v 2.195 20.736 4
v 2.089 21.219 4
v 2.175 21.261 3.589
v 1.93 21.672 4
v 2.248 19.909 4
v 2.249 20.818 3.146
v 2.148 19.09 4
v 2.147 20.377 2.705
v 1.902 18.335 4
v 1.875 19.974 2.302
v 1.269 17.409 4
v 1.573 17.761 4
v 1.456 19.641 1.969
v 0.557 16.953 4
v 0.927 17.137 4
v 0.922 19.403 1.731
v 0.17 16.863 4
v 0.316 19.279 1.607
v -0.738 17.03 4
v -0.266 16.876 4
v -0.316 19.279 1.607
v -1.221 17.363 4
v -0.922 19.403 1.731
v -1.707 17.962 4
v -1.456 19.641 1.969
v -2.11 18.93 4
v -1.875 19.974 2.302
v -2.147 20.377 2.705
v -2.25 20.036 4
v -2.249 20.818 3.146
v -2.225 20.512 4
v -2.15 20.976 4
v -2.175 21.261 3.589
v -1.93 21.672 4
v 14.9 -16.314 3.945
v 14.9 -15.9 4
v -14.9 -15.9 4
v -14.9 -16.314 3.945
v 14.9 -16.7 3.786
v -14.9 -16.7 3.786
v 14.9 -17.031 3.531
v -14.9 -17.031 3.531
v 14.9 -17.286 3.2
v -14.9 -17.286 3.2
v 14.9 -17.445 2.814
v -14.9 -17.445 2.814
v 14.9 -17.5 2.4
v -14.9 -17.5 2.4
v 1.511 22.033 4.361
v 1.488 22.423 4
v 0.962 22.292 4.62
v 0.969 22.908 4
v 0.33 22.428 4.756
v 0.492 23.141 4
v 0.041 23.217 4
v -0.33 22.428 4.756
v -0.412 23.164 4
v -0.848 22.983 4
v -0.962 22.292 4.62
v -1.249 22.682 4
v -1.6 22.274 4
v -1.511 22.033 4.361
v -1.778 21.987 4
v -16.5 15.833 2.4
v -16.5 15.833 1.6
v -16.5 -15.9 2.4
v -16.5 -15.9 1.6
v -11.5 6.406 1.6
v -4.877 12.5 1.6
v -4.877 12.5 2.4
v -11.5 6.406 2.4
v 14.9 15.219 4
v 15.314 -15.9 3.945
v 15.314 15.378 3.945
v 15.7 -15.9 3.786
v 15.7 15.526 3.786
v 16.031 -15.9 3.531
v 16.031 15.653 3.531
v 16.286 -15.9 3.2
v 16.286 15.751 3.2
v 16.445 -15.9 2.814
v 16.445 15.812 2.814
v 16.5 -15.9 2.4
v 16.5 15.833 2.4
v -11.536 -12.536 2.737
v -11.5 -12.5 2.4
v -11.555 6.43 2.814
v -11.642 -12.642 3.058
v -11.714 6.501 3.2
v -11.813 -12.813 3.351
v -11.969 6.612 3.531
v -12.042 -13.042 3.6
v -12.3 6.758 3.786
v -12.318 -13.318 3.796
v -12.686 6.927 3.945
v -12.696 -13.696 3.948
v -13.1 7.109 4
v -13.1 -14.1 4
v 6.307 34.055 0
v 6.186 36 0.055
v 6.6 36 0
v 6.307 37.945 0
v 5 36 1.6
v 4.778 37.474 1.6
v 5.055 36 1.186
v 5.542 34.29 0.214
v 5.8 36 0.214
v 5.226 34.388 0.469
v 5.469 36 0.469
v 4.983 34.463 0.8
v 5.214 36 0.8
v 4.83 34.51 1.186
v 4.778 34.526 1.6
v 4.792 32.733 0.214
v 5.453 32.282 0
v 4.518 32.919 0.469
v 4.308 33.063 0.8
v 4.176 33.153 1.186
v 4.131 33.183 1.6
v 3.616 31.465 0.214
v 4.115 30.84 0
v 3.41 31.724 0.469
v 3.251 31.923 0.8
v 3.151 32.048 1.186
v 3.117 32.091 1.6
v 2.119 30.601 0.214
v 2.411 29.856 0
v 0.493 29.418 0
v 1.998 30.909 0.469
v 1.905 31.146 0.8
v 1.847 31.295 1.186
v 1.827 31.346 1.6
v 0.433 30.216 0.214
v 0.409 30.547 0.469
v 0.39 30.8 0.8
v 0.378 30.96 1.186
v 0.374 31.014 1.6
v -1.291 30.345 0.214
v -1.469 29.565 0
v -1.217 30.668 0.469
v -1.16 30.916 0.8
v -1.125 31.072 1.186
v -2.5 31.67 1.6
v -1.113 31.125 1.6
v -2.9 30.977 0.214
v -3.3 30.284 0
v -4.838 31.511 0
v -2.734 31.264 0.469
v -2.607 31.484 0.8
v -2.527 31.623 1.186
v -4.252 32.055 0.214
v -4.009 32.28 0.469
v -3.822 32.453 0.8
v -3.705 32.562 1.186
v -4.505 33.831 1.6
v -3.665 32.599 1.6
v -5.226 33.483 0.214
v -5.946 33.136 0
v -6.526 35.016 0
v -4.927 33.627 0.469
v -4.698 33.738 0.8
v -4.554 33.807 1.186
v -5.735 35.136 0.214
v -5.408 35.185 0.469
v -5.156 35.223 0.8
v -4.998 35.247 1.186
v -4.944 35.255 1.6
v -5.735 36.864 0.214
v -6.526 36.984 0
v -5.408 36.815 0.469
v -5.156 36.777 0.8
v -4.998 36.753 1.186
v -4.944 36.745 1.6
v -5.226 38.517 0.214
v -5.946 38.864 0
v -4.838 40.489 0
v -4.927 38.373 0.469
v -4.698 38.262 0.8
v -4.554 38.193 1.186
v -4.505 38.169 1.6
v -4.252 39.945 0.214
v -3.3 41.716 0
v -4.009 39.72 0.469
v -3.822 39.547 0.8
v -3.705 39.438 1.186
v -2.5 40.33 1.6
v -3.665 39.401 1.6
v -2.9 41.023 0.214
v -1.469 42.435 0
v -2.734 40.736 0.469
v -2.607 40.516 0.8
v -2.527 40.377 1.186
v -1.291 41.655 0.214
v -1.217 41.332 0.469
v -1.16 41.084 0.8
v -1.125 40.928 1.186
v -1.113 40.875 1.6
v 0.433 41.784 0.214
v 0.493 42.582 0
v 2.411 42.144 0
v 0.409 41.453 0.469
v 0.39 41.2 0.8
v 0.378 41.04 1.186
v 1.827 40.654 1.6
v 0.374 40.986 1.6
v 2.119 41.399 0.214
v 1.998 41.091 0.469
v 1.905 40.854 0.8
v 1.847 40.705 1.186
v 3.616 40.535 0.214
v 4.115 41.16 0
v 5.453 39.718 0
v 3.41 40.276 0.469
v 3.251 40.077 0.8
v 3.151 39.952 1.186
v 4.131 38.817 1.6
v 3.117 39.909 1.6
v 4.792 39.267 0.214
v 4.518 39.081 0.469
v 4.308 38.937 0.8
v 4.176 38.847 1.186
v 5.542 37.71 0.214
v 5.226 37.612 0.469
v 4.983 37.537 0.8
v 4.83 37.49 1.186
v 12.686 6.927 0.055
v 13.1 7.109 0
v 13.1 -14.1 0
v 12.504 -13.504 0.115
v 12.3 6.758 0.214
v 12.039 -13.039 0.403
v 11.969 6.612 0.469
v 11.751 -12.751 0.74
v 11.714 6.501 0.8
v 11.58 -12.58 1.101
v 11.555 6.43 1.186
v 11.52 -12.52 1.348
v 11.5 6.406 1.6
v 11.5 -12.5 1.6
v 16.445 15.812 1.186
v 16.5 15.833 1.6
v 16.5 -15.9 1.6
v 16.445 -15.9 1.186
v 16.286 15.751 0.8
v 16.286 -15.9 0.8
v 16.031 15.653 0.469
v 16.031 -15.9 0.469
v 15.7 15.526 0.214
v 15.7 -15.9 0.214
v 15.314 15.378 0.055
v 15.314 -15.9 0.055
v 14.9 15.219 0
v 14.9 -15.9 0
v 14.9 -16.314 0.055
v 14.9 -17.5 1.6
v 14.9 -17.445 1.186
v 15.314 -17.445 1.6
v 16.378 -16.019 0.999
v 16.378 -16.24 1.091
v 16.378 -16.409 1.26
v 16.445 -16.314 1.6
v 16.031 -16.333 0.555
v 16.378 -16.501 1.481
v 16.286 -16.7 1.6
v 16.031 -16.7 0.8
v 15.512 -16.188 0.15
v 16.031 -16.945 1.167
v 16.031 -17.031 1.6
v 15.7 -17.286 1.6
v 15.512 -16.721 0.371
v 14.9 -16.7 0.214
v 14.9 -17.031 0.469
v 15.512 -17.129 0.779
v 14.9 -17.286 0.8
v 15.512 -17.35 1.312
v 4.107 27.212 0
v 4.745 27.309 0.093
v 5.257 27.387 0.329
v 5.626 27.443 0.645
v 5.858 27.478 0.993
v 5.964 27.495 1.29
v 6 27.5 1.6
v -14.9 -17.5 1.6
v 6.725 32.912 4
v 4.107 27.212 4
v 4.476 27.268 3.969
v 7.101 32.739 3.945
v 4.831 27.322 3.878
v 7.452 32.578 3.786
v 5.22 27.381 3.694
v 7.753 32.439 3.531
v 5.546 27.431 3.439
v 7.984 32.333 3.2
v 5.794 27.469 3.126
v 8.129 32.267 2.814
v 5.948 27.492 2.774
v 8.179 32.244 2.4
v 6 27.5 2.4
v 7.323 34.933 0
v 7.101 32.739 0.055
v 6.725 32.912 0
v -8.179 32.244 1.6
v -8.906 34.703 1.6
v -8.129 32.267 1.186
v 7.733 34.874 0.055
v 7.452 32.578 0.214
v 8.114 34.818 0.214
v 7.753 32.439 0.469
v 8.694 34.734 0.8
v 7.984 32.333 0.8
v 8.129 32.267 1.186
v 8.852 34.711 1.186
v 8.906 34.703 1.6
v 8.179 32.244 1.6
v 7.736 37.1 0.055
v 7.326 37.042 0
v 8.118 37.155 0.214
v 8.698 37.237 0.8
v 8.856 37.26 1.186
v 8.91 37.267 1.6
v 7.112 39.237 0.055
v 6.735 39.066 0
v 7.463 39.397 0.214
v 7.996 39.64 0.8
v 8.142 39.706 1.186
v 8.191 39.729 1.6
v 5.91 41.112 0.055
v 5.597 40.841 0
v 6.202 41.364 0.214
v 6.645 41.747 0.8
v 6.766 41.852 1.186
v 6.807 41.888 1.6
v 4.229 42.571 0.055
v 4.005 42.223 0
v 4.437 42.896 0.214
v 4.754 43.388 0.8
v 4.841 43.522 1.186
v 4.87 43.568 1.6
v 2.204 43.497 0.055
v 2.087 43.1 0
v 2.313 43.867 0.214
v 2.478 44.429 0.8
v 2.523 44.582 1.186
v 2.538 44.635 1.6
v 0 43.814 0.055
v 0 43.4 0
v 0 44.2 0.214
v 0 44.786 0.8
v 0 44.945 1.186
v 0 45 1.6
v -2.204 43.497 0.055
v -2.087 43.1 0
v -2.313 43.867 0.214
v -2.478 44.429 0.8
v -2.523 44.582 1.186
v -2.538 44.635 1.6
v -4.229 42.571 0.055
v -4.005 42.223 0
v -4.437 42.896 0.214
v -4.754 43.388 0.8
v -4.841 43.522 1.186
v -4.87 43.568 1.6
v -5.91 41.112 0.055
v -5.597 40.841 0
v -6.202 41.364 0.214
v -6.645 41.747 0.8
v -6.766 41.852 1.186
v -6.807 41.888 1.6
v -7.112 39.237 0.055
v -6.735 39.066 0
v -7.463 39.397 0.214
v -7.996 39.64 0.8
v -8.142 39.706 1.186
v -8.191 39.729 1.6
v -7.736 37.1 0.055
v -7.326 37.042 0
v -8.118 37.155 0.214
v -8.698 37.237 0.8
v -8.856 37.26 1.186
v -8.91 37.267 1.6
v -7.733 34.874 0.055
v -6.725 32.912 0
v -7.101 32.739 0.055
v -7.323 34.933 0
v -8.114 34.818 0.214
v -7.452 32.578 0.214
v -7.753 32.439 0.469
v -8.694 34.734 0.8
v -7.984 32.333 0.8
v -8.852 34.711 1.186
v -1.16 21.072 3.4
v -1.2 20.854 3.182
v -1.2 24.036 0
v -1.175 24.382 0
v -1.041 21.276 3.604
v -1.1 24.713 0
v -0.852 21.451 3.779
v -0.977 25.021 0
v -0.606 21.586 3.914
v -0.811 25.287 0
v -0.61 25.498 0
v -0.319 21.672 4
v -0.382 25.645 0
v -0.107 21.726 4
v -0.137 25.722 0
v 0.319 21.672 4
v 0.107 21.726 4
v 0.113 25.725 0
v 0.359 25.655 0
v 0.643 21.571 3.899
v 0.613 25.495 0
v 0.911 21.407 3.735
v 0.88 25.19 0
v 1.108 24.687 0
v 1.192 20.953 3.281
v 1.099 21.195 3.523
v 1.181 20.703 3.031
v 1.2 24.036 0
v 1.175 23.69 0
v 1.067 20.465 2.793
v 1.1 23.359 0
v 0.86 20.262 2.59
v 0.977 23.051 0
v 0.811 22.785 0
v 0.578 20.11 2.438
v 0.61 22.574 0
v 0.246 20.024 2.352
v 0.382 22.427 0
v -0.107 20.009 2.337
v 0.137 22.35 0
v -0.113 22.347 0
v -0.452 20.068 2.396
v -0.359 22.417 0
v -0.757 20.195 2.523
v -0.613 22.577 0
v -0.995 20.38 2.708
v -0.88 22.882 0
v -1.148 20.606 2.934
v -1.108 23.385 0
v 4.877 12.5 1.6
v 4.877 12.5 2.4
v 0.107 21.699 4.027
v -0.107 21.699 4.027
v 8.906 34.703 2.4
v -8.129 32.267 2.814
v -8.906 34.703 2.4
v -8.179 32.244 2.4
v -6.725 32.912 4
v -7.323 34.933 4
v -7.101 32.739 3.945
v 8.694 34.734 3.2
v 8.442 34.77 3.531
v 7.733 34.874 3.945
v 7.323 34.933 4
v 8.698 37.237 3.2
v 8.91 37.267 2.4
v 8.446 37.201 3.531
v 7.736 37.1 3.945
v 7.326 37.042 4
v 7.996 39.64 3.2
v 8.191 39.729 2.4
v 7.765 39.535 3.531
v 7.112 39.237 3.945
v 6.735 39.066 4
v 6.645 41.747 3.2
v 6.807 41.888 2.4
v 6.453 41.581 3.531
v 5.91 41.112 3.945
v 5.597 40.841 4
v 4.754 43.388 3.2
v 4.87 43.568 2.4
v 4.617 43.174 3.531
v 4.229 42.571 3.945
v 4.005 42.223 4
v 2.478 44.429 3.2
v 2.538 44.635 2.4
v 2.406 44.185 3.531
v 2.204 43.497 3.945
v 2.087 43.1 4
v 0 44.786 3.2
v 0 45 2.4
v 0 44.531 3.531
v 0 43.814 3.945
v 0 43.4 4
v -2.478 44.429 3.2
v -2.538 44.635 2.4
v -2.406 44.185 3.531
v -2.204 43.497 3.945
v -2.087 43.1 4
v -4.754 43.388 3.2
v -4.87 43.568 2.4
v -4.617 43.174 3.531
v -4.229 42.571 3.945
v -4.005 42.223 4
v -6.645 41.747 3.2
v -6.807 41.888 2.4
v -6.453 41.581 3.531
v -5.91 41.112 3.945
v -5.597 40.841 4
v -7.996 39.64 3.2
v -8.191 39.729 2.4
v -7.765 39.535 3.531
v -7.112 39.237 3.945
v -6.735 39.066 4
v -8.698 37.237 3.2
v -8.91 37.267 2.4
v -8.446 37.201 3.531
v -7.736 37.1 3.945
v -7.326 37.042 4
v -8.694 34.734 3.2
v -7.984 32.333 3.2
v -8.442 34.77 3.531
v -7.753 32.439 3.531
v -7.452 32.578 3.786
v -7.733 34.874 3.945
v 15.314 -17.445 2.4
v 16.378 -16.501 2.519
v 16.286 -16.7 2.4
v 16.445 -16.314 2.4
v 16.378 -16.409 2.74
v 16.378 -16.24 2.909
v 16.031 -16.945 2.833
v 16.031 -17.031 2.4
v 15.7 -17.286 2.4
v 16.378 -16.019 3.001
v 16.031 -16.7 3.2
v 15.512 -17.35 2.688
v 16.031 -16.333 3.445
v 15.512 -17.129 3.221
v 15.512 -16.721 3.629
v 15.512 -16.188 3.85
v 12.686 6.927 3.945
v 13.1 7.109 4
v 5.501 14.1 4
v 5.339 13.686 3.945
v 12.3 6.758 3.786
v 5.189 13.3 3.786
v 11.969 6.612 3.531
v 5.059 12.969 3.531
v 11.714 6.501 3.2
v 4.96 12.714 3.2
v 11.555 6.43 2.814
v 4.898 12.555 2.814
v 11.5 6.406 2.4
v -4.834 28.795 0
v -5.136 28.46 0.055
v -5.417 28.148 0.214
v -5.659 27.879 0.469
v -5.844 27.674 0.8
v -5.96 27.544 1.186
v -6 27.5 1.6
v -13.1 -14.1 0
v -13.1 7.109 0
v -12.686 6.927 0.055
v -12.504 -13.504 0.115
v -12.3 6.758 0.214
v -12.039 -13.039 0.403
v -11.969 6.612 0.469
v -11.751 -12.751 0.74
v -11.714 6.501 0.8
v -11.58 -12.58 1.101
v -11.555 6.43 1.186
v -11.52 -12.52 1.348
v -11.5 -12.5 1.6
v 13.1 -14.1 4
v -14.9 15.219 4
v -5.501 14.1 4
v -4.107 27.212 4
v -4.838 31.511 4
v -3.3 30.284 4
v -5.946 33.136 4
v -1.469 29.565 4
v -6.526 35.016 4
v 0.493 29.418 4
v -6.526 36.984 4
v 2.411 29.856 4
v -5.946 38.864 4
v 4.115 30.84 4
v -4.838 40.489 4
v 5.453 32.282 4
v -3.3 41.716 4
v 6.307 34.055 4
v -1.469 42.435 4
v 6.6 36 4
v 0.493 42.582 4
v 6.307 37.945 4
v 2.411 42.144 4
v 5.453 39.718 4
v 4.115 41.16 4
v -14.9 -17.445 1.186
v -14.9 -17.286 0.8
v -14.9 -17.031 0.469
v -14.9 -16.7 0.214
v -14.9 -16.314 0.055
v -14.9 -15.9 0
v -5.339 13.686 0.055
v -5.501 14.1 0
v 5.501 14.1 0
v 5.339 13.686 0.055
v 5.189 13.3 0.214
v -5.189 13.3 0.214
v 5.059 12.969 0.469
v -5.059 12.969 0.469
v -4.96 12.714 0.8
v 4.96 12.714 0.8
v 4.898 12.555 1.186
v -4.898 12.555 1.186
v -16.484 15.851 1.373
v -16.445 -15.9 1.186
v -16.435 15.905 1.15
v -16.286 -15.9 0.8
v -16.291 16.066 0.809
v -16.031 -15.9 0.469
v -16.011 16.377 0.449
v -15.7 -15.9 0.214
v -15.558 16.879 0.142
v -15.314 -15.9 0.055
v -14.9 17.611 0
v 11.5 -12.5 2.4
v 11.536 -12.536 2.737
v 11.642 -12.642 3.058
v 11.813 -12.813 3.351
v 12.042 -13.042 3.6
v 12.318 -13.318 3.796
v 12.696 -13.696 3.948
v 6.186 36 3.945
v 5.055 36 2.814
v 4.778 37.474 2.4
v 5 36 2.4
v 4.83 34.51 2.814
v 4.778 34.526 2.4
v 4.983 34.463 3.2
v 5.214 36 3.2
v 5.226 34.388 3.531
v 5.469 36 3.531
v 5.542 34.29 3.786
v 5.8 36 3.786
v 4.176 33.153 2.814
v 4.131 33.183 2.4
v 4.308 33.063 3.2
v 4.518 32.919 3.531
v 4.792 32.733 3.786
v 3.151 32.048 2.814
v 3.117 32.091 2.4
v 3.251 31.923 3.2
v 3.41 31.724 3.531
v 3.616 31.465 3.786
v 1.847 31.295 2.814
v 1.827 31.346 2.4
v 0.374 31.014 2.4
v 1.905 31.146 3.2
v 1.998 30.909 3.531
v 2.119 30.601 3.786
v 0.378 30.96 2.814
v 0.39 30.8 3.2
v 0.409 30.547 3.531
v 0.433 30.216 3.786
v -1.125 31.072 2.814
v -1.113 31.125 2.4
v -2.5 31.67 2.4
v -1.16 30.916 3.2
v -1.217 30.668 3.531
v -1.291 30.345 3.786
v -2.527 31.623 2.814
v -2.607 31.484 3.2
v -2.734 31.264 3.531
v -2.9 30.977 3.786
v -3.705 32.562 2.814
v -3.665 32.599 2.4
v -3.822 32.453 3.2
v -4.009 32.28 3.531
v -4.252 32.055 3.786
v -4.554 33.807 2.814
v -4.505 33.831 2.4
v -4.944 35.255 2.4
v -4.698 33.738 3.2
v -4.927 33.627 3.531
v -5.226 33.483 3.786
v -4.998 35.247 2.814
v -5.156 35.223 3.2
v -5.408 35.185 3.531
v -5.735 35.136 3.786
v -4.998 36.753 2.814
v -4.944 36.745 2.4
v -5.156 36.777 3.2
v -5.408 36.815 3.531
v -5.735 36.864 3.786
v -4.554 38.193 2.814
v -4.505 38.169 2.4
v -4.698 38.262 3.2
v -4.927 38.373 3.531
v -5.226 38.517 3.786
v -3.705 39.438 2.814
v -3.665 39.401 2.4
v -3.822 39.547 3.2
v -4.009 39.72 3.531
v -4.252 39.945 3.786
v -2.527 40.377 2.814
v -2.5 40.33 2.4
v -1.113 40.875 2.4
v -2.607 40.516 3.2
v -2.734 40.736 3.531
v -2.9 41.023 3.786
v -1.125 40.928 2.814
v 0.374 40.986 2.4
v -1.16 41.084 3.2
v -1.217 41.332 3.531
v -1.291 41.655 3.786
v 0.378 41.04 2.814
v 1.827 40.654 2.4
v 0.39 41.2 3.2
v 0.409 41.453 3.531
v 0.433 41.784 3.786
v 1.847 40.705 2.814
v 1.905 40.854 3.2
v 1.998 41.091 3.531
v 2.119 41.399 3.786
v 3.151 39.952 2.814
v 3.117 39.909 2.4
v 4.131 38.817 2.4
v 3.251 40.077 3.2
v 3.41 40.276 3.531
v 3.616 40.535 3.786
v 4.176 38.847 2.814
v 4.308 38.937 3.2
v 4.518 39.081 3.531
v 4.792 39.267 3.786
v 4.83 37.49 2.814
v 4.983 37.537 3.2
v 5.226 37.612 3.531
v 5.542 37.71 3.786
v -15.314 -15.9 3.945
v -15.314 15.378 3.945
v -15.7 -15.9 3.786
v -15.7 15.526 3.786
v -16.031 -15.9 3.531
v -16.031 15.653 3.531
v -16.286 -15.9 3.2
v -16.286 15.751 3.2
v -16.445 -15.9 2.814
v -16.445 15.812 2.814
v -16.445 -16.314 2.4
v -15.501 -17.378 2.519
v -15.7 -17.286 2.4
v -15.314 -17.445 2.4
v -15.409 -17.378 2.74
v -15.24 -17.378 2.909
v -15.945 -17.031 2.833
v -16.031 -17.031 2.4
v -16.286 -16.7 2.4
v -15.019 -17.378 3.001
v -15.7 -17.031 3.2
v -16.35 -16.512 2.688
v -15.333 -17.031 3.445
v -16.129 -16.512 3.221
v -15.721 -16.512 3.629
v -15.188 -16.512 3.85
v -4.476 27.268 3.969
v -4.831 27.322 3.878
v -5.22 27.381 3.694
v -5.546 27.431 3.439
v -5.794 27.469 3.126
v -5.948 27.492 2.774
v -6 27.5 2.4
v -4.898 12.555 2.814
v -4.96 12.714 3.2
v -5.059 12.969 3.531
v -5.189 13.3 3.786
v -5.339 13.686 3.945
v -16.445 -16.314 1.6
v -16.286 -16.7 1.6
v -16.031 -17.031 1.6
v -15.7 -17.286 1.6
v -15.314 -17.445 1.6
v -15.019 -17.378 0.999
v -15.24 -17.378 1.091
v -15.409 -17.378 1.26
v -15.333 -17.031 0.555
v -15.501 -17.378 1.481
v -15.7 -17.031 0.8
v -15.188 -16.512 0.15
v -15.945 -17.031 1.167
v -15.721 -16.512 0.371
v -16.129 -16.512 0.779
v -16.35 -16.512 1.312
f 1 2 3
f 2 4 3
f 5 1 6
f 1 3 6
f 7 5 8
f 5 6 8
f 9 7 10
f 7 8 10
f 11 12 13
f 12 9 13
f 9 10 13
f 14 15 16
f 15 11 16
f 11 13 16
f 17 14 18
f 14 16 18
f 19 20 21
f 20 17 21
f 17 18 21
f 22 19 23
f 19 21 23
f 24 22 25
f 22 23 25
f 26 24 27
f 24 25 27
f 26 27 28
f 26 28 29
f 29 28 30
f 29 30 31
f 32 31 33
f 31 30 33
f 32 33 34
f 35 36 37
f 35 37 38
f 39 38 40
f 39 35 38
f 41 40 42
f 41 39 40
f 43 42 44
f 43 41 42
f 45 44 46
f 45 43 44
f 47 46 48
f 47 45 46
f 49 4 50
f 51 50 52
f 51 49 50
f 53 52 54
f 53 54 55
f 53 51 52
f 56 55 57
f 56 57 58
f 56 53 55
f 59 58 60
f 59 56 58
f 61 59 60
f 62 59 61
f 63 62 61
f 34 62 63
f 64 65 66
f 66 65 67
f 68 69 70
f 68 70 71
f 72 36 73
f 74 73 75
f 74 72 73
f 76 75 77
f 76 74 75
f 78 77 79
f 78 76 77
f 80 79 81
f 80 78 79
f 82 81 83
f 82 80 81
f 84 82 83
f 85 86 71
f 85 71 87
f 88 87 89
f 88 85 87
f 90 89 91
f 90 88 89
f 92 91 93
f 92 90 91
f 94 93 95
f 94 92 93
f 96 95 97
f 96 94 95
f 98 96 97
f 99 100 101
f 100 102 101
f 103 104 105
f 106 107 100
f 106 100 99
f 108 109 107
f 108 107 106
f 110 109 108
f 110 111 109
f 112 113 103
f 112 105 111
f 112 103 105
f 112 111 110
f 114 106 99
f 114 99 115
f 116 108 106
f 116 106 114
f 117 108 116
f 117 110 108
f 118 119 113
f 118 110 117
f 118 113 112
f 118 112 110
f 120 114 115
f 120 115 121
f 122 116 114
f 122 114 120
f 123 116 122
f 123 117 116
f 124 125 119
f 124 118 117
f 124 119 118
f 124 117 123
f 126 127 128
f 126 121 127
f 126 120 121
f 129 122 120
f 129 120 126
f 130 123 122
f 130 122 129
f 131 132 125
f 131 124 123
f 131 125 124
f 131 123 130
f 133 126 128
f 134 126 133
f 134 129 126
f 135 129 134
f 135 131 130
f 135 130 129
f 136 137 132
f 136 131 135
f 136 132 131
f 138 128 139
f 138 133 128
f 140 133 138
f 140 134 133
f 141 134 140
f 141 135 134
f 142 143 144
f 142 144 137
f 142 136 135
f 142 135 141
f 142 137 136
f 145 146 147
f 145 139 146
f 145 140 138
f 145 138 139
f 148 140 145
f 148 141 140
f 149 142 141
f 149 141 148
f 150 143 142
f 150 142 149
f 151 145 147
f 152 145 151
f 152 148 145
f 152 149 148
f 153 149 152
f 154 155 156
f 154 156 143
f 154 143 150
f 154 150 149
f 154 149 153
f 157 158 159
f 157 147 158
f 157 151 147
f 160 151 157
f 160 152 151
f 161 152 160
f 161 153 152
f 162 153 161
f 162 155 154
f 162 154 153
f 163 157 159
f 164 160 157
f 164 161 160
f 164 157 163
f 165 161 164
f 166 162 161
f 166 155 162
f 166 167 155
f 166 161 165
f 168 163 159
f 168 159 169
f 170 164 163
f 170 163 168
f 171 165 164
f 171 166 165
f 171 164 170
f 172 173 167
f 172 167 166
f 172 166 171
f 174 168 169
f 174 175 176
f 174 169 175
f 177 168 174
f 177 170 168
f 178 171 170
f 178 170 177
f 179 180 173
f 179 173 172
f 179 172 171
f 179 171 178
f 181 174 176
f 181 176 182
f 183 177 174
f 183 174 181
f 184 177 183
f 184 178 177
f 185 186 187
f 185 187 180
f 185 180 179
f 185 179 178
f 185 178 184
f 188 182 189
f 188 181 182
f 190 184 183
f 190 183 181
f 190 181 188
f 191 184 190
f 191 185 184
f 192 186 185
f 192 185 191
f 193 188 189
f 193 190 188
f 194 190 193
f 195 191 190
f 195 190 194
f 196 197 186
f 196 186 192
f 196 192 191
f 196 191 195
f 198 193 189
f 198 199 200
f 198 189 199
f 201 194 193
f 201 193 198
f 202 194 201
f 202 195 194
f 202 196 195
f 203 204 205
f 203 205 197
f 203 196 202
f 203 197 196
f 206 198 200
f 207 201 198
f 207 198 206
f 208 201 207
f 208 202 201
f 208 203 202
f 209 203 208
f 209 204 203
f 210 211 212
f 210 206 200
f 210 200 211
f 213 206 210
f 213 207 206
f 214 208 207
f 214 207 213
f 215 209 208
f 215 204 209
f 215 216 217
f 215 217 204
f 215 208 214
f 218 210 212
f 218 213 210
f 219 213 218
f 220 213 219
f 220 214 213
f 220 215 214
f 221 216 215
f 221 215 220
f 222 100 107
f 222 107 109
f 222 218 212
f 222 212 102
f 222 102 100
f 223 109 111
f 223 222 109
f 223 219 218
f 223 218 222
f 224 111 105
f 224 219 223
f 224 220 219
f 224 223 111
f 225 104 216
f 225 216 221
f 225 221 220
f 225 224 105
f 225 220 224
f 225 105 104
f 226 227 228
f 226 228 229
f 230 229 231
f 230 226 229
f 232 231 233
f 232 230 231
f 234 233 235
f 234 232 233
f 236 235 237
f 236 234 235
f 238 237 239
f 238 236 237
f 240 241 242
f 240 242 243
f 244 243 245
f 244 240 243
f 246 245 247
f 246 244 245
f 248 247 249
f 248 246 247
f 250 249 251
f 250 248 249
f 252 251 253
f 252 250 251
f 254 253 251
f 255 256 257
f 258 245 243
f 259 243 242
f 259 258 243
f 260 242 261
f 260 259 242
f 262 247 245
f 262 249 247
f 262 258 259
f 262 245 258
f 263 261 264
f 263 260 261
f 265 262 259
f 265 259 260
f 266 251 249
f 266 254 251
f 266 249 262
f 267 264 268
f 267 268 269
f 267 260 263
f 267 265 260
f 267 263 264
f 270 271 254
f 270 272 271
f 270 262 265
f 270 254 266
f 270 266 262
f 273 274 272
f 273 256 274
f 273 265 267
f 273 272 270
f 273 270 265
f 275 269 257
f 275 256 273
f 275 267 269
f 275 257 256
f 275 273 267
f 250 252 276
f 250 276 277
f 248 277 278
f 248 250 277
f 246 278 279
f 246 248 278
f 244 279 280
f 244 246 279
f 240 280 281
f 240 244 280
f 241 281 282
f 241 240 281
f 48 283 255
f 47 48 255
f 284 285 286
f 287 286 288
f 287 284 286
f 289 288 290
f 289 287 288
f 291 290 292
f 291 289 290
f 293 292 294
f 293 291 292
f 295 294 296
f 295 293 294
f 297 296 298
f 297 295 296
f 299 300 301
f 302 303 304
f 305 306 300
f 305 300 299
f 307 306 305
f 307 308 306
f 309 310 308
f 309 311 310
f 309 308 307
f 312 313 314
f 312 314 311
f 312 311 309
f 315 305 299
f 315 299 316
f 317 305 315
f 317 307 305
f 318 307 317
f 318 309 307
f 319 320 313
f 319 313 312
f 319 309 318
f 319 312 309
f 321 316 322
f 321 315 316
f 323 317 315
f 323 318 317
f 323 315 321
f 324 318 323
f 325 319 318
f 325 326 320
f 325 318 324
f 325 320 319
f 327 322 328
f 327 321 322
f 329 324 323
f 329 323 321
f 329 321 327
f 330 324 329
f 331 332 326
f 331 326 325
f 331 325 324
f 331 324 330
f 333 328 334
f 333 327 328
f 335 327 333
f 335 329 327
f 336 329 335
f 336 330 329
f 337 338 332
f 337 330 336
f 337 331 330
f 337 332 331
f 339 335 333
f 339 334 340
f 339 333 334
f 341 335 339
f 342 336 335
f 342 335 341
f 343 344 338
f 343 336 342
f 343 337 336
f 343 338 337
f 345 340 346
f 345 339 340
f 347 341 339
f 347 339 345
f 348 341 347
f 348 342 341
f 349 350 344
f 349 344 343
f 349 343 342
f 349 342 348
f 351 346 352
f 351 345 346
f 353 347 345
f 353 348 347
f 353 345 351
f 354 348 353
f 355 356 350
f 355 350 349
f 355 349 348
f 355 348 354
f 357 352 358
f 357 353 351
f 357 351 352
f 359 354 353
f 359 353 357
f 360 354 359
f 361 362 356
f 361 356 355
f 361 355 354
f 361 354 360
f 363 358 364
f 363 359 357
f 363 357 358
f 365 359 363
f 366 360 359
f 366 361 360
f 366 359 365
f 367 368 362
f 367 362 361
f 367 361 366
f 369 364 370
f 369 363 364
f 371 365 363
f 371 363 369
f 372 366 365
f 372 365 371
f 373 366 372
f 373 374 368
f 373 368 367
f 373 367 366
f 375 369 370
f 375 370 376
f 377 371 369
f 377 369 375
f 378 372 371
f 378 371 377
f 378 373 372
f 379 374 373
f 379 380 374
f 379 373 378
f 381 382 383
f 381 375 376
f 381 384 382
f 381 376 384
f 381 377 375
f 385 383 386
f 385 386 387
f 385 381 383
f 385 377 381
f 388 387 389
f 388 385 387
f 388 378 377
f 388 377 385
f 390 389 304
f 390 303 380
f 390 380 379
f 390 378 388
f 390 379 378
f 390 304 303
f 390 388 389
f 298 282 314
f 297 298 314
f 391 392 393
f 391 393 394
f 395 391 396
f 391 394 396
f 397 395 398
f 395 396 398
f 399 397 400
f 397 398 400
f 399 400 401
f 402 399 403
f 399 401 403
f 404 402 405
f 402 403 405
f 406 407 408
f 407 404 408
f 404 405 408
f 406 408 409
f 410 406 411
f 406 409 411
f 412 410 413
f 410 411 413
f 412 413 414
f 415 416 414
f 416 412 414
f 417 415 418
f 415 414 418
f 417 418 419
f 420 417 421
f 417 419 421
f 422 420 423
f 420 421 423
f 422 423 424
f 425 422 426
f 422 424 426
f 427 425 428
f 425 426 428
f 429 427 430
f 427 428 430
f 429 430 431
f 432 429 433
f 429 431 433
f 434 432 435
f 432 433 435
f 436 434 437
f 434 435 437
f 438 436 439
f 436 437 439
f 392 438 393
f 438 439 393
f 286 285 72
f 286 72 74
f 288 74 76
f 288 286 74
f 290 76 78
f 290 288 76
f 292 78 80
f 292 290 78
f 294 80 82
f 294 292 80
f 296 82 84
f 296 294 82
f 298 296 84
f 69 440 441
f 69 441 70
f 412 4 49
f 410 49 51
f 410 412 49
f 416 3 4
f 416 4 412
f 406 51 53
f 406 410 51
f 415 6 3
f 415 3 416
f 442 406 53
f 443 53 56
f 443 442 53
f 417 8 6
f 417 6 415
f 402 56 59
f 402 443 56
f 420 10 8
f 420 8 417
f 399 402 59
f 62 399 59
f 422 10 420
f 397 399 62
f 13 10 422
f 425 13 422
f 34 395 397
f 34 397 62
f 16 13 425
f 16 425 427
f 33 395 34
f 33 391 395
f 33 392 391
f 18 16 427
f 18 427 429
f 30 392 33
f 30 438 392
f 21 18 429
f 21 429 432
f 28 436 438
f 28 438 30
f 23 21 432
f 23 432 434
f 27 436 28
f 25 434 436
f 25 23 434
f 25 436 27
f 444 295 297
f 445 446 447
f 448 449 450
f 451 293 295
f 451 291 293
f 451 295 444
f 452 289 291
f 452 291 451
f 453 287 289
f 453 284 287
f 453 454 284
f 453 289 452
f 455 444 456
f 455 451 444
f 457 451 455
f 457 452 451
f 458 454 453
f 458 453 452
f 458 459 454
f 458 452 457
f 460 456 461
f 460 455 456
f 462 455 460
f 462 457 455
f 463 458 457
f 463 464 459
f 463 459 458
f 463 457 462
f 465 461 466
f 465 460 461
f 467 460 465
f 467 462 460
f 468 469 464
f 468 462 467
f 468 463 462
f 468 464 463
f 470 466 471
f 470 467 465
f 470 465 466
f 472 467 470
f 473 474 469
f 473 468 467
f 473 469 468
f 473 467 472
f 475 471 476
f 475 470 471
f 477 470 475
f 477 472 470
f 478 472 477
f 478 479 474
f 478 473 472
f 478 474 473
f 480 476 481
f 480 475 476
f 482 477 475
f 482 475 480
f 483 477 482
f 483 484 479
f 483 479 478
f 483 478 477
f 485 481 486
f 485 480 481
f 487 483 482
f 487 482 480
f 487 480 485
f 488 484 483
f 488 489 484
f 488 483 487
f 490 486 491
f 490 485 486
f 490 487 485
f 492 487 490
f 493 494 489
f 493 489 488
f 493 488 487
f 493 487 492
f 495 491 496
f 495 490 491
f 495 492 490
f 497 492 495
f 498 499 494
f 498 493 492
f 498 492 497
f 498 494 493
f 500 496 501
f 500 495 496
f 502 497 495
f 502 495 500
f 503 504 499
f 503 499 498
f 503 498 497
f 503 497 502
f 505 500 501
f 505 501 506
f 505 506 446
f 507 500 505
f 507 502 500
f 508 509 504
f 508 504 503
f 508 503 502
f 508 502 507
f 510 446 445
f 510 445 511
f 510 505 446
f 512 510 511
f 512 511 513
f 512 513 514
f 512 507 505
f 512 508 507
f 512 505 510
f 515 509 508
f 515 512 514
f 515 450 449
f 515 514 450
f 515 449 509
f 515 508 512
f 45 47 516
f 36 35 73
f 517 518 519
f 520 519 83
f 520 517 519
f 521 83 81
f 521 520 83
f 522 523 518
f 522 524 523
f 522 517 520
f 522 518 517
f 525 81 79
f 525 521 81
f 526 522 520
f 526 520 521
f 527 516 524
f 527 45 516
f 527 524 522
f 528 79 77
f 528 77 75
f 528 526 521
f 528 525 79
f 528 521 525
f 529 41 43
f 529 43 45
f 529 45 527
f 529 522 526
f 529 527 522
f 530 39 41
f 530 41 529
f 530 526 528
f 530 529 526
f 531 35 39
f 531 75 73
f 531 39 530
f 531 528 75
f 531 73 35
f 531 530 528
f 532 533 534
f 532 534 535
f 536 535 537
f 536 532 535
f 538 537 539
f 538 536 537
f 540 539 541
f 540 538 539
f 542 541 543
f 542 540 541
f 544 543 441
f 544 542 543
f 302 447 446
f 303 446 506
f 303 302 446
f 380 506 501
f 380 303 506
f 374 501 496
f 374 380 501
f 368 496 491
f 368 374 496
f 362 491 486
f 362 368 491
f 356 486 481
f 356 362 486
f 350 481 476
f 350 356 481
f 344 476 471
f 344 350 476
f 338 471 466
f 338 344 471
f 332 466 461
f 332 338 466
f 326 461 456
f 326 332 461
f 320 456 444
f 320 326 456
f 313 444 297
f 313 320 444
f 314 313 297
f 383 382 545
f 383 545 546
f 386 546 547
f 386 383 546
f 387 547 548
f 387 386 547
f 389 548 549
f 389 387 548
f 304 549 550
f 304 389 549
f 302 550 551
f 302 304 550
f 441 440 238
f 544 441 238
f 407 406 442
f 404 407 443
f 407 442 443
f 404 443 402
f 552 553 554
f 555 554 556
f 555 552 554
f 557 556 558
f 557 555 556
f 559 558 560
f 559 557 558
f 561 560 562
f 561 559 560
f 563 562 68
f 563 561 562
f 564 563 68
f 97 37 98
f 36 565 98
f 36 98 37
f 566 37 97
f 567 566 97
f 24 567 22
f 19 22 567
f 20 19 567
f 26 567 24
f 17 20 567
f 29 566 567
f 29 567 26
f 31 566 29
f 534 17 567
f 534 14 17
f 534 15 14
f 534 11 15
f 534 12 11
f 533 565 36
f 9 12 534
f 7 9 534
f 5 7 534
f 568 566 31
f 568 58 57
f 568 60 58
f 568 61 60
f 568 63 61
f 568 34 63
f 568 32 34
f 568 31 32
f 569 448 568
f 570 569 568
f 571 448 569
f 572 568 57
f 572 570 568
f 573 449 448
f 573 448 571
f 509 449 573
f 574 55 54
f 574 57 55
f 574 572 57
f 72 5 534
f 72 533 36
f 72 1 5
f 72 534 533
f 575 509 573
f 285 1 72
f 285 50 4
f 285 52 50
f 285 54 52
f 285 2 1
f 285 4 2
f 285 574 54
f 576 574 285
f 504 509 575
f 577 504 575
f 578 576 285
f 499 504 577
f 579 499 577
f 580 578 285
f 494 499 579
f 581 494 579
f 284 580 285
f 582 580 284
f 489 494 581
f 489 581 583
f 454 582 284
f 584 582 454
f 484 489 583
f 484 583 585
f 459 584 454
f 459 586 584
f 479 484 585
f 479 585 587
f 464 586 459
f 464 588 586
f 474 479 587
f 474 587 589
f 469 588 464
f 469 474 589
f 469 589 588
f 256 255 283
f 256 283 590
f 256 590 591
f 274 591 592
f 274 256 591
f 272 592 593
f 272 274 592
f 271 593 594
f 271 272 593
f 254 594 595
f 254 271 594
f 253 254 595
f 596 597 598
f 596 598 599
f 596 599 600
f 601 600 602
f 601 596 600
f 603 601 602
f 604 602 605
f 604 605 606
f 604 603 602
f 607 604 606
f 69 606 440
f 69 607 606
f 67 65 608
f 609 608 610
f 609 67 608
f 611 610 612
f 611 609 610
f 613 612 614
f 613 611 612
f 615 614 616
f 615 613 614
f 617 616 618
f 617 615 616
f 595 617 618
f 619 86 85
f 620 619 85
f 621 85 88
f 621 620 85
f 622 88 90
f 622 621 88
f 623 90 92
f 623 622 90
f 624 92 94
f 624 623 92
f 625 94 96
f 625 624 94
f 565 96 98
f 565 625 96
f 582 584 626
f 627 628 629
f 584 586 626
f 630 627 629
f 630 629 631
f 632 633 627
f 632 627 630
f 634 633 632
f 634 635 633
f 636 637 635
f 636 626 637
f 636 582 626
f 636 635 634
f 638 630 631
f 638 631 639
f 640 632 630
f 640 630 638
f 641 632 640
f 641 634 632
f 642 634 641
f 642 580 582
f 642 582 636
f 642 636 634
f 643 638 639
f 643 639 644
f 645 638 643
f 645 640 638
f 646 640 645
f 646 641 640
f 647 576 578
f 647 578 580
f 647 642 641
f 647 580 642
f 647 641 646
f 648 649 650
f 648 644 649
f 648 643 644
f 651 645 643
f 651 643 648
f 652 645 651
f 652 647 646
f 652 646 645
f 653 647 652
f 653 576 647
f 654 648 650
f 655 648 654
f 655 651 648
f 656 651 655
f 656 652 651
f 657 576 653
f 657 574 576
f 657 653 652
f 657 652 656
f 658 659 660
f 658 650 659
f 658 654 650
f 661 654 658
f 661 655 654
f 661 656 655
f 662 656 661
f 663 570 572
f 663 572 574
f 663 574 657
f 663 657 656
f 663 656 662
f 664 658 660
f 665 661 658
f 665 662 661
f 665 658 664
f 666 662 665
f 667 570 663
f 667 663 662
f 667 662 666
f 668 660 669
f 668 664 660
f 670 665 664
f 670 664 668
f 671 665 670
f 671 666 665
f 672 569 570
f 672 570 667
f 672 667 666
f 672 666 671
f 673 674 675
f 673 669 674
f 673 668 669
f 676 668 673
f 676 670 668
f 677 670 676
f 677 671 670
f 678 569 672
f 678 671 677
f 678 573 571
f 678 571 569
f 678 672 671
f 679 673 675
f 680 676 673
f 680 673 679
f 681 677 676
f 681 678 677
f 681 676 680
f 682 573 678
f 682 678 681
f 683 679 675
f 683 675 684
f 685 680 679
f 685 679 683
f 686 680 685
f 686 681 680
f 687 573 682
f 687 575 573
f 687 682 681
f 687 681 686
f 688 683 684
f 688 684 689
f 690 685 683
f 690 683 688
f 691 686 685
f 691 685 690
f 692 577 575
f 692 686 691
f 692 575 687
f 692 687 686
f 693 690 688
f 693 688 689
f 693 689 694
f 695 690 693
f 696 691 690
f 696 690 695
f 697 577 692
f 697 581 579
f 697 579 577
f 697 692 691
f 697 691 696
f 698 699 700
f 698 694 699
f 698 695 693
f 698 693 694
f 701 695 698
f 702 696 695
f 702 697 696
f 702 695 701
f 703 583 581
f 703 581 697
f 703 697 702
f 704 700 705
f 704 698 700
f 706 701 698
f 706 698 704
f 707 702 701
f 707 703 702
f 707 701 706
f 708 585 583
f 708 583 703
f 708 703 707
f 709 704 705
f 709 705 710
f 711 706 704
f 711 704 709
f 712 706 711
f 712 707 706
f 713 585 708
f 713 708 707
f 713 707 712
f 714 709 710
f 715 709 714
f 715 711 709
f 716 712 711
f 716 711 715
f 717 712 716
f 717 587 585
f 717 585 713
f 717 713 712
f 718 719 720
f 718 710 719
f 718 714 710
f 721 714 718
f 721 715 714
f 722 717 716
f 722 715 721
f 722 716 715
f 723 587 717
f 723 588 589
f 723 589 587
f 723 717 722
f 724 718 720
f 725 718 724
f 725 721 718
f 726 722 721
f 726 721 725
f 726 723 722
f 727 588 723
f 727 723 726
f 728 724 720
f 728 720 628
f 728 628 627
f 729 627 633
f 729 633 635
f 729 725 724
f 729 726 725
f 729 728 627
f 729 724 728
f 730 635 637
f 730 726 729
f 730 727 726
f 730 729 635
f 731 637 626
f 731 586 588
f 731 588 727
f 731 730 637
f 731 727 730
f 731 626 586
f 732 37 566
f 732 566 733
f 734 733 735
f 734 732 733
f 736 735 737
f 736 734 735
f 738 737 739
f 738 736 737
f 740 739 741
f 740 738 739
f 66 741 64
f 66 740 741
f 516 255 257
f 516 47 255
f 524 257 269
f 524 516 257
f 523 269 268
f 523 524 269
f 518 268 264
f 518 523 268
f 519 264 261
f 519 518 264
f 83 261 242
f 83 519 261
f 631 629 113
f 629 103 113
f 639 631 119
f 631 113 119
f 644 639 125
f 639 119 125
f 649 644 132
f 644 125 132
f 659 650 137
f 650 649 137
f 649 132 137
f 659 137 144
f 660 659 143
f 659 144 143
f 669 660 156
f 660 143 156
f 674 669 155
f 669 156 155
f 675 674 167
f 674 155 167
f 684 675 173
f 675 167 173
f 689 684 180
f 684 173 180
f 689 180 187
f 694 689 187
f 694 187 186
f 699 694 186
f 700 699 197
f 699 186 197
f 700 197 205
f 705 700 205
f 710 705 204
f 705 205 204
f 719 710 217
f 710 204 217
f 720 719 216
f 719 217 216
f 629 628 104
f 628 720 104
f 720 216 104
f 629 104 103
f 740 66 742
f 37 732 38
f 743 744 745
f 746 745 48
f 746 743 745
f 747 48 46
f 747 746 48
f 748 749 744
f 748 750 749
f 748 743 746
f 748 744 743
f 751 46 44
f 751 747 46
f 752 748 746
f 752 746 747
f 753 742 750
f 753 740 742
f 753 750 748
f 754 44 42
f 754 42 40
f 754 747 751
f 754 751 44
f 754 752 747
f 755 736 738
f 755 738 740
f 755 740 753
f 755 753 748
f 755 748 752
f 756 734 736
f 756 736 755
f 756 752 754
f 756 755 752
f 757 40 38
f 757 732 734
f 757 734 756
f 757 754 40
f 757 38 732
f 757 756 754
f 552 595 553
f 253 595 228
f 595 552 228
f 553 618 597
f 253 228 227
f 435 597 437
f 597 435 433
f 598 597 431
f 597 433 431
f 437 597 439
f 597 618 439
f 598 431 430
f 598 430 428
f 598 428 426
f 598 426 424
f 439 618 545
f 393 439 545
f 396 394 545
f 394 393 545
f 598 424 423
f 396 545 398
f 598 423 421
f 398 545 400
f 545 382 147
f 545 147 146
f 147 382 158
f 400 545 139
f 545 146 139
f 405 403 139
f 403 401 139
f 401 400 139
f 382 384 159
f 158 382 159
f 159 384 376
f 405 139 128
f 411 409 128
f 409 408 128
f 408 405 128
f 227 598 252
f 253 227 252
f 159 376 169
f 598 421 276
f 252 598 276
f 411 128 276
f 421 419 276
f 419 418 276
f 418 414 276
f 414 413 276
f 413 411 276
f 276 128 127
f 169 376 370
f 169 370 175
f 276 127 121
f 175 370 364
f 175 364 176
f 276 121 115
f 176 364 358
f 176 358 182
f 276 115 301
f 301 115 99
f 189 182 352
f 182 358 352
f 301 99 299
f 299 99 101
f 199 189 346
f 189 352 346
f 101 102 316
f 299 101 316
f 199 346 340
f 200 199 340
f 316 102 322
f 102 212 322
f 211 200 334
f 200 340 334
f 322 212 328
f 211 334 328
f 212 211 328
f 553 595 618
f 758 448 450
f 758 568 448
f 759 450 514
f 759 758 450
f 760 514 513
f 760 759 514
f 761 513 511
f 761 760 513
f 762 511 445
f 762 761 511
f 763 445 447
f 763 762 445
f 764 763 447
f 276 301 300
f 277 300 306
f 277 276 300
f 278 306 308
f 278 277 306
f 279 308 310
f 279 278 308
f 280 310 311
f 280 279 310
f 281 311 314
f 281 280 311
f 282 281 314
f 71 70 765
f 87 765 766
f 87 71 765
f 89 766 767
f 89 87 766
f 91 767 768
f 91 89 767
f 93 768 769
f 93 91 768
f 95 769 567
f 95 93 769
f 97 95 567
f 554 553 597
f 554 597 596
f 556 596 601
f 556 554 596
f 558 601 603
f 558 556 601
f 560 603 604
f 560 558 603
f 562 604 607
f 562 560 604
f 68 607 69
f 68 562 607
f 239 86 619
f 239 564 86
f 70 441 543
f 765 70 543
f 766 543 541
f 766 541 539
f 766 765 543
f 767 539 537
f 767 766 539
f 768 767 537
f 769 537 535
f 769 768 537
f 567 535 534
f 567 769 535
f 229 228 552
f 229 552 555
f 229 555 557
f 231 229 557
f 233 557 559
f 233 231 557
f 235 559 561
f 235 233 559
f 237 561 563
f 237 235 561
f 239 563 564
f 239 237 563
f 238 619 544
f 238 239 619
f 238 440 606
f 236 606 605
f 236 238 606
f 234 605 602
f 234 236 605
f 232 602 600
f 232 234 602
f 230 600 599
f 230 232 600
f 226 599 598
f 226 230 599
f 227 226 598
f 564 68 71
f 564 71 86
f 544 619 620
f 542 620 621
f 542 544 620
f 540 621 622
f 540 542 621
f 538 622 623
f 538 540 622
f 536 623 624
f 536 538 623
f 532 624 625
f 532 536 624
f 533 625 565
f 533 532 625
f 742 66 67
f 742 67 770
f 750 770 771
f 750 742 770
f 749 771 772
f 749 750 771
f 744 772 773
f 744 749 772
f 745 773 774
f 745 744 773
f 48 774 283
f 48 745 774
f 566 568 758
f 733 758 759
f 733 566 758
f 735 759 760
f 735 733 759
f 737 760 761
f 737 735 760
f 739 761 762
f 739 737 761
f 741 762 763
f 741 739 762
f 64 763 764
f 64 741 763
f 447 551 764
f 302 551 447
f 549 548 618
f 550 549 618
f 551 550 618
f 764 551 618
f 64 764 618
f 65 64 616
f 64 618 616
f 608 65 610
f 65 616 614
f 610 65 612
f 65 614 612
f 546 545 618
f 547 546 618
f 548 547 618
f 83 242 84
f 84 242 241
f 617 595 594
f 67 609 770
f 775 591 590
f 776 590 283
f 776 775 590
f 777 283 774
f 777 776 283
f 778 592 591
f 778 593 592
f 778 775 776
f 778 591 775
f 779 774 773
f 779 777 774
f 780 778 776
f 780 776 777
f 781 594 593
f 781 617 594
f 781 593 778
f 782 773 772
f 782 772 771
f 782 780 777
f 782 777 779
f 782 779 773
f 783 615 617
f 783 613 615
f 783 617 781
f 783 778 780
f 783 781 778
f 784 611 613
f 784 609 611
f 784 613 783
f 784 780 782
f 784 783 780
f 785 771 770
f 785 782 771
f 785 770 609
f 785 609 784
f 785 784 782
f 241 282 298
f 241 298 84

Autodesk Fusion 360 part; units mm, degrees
sketch "Sketch1" plane through (0, 0, 0) normal (0, 0, 1) x (1, 0, 0)
  line L0 (11.5, 12.5) -> (-11.5, 12.5)
  line L1 (-11.5, 12.5) -> (-11.5, -12.5)
  line L2 (-11.5, -12.5) -> (11.5, -12.5)
  line L3 (11.5, -12.5) -> (11.5, 12.5)
  line L4 (11.5, 12.5) -> (-11.5, -12.5) construction
  line L5 (-11.5, 12.5) -> (11.5, -12.5) construction
  line L6 (0, 38) -> (0, -20) construction
  line L7 (0, 27.5) -> (-6, 27.5)
  line L8 (16.5, -17.5) -> (16.5, 17.5)
  line L9 (16.5, 17.5) -> (-16.5, 17.5)
  line L10 (-16.5, 17.5) -> (-16.5, -17.5)
  line L11 (-16.5, -17.5) -> (16.5, -17.5)
  line L12 (-6, 27.5) -> (-16.5, 15.8333)
  line L13 (0, 27.5) -> (6, 27.5)
  line L14 (6, 27.5) -> (16.5, 15.8333)
  line L15 (-4.8766, 12.5) -> (-11.5, 6.4065)
  line L16 (4.8766, 12.5) -> (11.5, 6.4065)
  circle A0 centre (0, 36) radius 5
  circle A1 centre (0, 36) radius 9
  line L17 (0, 24.036) -> (-17, 24.036) construction
  line L18 (-6, 27.5) -> (-8.1787, 32.2438)
  line L19 (6, 27.5) -> (8.1787, 32.2438)
  point P0 (0, 24.036)
  dimension "d1" = 23
  dimension "d2" = 25
  dimension "d7" = 40
  dimension "d8" = 5
  dimension "d9" = 36.536
  dimension "d10" = 9
  dimension "d11" = 10
  dimension "d12" = 4
extrude "Extrude1" add sketch "Sketch1" along normal blind 4 contours L0 L3 L16 | L0 L1 L15 | L7 L13 A1 | L7 L13 A1 | L7 L9 L12 L13 L14 A1 | L7 A1 L18 | L13 A1 L19 | L8 L9 L10 L11 L12 L14
ref_plane "WorkPlane1" through (-8.5, 24.036, 0) normal (0, -0.7071, 0.7071) x (-1, 0, 0)
sketch "Sketch2" plane through (-8.5, 24.036, 0) normal (0, -0.7071, 0.7071) x (-1, 0, 0)
  circle A0 centre (-8.5, 0) radius 1.2
  circle A1 centre (-8.5, 0) radius 2.25
  circle A2 centre (-8.5, 0) radius 4
  point P0 (-8.5, 0)
  dimension "d16" = 2.4
  dimension "d17" = 4.5
  dimension "d18" = 8
extrude "Extrude2" cut sketch "Sketch2" along normal through all and the other way blind 7.753 contours A0
ref_plane "WorkPlane2" through (0, 20.854, 3.182) normal (0, -0.7071, 0.7071) x (-1, 0, 0)
sketch "Sketch3" plane through (0, 20.854, 3.182) normal (0, -0.7071, 0.7071) x (-1, 0, 0)
  circle A0 centre (0, 0) radius 1.2
  circle A1 centre (0, 0) radius 2.25
  circle A2 centre (0, 0) radius 4
extrude "Extrude4" cut sketch "Sketch3" along normal blind 10.1125 contours A1
extrude "Extrude6" add sketch "Sketch3" against normal blind 1.187 contours A1
fillet "Fillet1" radius 1.6 31 edges at (0, 45, 4) (-7.0893, 29.8719, 4) (7.0893, 29.8719, 4) (-4.6616, 37.8081, 4) (-4.6616, 37.8081, 0) (0, 45, 0) (-7.0893, 29.8719, 0) (7.0893, 29.8719, 0) (-11.25, 21.6667, 4) (-16.5, -0.8333, 4) (-16.5, -0.8333, 0) (0, -17.5, 4) (0, -17.5, 0) (16.5, -0.8333, 4) (16.5, -0.8333, 0) (-8.1883, 9.4532, 4) (0, 12.5, 4) (-11.5, -3.0468, 4) (0, -12.5, 4) (11.5, -3.0468, 4) (8.1883, 9.4532, 4) (11.5, -3.0468, 0) (0, -12.5, 0) (-11.5, -3.0468, 0) (0, 12.5, 0) (-8.1883, 9.4532, 0) (8.1883, 9.4532, 0) (11.25, 21.6667, 4) (11.25, 21.6667, 0) (16.5, -17.5, 2) (-16.5, -17.5, 2)
